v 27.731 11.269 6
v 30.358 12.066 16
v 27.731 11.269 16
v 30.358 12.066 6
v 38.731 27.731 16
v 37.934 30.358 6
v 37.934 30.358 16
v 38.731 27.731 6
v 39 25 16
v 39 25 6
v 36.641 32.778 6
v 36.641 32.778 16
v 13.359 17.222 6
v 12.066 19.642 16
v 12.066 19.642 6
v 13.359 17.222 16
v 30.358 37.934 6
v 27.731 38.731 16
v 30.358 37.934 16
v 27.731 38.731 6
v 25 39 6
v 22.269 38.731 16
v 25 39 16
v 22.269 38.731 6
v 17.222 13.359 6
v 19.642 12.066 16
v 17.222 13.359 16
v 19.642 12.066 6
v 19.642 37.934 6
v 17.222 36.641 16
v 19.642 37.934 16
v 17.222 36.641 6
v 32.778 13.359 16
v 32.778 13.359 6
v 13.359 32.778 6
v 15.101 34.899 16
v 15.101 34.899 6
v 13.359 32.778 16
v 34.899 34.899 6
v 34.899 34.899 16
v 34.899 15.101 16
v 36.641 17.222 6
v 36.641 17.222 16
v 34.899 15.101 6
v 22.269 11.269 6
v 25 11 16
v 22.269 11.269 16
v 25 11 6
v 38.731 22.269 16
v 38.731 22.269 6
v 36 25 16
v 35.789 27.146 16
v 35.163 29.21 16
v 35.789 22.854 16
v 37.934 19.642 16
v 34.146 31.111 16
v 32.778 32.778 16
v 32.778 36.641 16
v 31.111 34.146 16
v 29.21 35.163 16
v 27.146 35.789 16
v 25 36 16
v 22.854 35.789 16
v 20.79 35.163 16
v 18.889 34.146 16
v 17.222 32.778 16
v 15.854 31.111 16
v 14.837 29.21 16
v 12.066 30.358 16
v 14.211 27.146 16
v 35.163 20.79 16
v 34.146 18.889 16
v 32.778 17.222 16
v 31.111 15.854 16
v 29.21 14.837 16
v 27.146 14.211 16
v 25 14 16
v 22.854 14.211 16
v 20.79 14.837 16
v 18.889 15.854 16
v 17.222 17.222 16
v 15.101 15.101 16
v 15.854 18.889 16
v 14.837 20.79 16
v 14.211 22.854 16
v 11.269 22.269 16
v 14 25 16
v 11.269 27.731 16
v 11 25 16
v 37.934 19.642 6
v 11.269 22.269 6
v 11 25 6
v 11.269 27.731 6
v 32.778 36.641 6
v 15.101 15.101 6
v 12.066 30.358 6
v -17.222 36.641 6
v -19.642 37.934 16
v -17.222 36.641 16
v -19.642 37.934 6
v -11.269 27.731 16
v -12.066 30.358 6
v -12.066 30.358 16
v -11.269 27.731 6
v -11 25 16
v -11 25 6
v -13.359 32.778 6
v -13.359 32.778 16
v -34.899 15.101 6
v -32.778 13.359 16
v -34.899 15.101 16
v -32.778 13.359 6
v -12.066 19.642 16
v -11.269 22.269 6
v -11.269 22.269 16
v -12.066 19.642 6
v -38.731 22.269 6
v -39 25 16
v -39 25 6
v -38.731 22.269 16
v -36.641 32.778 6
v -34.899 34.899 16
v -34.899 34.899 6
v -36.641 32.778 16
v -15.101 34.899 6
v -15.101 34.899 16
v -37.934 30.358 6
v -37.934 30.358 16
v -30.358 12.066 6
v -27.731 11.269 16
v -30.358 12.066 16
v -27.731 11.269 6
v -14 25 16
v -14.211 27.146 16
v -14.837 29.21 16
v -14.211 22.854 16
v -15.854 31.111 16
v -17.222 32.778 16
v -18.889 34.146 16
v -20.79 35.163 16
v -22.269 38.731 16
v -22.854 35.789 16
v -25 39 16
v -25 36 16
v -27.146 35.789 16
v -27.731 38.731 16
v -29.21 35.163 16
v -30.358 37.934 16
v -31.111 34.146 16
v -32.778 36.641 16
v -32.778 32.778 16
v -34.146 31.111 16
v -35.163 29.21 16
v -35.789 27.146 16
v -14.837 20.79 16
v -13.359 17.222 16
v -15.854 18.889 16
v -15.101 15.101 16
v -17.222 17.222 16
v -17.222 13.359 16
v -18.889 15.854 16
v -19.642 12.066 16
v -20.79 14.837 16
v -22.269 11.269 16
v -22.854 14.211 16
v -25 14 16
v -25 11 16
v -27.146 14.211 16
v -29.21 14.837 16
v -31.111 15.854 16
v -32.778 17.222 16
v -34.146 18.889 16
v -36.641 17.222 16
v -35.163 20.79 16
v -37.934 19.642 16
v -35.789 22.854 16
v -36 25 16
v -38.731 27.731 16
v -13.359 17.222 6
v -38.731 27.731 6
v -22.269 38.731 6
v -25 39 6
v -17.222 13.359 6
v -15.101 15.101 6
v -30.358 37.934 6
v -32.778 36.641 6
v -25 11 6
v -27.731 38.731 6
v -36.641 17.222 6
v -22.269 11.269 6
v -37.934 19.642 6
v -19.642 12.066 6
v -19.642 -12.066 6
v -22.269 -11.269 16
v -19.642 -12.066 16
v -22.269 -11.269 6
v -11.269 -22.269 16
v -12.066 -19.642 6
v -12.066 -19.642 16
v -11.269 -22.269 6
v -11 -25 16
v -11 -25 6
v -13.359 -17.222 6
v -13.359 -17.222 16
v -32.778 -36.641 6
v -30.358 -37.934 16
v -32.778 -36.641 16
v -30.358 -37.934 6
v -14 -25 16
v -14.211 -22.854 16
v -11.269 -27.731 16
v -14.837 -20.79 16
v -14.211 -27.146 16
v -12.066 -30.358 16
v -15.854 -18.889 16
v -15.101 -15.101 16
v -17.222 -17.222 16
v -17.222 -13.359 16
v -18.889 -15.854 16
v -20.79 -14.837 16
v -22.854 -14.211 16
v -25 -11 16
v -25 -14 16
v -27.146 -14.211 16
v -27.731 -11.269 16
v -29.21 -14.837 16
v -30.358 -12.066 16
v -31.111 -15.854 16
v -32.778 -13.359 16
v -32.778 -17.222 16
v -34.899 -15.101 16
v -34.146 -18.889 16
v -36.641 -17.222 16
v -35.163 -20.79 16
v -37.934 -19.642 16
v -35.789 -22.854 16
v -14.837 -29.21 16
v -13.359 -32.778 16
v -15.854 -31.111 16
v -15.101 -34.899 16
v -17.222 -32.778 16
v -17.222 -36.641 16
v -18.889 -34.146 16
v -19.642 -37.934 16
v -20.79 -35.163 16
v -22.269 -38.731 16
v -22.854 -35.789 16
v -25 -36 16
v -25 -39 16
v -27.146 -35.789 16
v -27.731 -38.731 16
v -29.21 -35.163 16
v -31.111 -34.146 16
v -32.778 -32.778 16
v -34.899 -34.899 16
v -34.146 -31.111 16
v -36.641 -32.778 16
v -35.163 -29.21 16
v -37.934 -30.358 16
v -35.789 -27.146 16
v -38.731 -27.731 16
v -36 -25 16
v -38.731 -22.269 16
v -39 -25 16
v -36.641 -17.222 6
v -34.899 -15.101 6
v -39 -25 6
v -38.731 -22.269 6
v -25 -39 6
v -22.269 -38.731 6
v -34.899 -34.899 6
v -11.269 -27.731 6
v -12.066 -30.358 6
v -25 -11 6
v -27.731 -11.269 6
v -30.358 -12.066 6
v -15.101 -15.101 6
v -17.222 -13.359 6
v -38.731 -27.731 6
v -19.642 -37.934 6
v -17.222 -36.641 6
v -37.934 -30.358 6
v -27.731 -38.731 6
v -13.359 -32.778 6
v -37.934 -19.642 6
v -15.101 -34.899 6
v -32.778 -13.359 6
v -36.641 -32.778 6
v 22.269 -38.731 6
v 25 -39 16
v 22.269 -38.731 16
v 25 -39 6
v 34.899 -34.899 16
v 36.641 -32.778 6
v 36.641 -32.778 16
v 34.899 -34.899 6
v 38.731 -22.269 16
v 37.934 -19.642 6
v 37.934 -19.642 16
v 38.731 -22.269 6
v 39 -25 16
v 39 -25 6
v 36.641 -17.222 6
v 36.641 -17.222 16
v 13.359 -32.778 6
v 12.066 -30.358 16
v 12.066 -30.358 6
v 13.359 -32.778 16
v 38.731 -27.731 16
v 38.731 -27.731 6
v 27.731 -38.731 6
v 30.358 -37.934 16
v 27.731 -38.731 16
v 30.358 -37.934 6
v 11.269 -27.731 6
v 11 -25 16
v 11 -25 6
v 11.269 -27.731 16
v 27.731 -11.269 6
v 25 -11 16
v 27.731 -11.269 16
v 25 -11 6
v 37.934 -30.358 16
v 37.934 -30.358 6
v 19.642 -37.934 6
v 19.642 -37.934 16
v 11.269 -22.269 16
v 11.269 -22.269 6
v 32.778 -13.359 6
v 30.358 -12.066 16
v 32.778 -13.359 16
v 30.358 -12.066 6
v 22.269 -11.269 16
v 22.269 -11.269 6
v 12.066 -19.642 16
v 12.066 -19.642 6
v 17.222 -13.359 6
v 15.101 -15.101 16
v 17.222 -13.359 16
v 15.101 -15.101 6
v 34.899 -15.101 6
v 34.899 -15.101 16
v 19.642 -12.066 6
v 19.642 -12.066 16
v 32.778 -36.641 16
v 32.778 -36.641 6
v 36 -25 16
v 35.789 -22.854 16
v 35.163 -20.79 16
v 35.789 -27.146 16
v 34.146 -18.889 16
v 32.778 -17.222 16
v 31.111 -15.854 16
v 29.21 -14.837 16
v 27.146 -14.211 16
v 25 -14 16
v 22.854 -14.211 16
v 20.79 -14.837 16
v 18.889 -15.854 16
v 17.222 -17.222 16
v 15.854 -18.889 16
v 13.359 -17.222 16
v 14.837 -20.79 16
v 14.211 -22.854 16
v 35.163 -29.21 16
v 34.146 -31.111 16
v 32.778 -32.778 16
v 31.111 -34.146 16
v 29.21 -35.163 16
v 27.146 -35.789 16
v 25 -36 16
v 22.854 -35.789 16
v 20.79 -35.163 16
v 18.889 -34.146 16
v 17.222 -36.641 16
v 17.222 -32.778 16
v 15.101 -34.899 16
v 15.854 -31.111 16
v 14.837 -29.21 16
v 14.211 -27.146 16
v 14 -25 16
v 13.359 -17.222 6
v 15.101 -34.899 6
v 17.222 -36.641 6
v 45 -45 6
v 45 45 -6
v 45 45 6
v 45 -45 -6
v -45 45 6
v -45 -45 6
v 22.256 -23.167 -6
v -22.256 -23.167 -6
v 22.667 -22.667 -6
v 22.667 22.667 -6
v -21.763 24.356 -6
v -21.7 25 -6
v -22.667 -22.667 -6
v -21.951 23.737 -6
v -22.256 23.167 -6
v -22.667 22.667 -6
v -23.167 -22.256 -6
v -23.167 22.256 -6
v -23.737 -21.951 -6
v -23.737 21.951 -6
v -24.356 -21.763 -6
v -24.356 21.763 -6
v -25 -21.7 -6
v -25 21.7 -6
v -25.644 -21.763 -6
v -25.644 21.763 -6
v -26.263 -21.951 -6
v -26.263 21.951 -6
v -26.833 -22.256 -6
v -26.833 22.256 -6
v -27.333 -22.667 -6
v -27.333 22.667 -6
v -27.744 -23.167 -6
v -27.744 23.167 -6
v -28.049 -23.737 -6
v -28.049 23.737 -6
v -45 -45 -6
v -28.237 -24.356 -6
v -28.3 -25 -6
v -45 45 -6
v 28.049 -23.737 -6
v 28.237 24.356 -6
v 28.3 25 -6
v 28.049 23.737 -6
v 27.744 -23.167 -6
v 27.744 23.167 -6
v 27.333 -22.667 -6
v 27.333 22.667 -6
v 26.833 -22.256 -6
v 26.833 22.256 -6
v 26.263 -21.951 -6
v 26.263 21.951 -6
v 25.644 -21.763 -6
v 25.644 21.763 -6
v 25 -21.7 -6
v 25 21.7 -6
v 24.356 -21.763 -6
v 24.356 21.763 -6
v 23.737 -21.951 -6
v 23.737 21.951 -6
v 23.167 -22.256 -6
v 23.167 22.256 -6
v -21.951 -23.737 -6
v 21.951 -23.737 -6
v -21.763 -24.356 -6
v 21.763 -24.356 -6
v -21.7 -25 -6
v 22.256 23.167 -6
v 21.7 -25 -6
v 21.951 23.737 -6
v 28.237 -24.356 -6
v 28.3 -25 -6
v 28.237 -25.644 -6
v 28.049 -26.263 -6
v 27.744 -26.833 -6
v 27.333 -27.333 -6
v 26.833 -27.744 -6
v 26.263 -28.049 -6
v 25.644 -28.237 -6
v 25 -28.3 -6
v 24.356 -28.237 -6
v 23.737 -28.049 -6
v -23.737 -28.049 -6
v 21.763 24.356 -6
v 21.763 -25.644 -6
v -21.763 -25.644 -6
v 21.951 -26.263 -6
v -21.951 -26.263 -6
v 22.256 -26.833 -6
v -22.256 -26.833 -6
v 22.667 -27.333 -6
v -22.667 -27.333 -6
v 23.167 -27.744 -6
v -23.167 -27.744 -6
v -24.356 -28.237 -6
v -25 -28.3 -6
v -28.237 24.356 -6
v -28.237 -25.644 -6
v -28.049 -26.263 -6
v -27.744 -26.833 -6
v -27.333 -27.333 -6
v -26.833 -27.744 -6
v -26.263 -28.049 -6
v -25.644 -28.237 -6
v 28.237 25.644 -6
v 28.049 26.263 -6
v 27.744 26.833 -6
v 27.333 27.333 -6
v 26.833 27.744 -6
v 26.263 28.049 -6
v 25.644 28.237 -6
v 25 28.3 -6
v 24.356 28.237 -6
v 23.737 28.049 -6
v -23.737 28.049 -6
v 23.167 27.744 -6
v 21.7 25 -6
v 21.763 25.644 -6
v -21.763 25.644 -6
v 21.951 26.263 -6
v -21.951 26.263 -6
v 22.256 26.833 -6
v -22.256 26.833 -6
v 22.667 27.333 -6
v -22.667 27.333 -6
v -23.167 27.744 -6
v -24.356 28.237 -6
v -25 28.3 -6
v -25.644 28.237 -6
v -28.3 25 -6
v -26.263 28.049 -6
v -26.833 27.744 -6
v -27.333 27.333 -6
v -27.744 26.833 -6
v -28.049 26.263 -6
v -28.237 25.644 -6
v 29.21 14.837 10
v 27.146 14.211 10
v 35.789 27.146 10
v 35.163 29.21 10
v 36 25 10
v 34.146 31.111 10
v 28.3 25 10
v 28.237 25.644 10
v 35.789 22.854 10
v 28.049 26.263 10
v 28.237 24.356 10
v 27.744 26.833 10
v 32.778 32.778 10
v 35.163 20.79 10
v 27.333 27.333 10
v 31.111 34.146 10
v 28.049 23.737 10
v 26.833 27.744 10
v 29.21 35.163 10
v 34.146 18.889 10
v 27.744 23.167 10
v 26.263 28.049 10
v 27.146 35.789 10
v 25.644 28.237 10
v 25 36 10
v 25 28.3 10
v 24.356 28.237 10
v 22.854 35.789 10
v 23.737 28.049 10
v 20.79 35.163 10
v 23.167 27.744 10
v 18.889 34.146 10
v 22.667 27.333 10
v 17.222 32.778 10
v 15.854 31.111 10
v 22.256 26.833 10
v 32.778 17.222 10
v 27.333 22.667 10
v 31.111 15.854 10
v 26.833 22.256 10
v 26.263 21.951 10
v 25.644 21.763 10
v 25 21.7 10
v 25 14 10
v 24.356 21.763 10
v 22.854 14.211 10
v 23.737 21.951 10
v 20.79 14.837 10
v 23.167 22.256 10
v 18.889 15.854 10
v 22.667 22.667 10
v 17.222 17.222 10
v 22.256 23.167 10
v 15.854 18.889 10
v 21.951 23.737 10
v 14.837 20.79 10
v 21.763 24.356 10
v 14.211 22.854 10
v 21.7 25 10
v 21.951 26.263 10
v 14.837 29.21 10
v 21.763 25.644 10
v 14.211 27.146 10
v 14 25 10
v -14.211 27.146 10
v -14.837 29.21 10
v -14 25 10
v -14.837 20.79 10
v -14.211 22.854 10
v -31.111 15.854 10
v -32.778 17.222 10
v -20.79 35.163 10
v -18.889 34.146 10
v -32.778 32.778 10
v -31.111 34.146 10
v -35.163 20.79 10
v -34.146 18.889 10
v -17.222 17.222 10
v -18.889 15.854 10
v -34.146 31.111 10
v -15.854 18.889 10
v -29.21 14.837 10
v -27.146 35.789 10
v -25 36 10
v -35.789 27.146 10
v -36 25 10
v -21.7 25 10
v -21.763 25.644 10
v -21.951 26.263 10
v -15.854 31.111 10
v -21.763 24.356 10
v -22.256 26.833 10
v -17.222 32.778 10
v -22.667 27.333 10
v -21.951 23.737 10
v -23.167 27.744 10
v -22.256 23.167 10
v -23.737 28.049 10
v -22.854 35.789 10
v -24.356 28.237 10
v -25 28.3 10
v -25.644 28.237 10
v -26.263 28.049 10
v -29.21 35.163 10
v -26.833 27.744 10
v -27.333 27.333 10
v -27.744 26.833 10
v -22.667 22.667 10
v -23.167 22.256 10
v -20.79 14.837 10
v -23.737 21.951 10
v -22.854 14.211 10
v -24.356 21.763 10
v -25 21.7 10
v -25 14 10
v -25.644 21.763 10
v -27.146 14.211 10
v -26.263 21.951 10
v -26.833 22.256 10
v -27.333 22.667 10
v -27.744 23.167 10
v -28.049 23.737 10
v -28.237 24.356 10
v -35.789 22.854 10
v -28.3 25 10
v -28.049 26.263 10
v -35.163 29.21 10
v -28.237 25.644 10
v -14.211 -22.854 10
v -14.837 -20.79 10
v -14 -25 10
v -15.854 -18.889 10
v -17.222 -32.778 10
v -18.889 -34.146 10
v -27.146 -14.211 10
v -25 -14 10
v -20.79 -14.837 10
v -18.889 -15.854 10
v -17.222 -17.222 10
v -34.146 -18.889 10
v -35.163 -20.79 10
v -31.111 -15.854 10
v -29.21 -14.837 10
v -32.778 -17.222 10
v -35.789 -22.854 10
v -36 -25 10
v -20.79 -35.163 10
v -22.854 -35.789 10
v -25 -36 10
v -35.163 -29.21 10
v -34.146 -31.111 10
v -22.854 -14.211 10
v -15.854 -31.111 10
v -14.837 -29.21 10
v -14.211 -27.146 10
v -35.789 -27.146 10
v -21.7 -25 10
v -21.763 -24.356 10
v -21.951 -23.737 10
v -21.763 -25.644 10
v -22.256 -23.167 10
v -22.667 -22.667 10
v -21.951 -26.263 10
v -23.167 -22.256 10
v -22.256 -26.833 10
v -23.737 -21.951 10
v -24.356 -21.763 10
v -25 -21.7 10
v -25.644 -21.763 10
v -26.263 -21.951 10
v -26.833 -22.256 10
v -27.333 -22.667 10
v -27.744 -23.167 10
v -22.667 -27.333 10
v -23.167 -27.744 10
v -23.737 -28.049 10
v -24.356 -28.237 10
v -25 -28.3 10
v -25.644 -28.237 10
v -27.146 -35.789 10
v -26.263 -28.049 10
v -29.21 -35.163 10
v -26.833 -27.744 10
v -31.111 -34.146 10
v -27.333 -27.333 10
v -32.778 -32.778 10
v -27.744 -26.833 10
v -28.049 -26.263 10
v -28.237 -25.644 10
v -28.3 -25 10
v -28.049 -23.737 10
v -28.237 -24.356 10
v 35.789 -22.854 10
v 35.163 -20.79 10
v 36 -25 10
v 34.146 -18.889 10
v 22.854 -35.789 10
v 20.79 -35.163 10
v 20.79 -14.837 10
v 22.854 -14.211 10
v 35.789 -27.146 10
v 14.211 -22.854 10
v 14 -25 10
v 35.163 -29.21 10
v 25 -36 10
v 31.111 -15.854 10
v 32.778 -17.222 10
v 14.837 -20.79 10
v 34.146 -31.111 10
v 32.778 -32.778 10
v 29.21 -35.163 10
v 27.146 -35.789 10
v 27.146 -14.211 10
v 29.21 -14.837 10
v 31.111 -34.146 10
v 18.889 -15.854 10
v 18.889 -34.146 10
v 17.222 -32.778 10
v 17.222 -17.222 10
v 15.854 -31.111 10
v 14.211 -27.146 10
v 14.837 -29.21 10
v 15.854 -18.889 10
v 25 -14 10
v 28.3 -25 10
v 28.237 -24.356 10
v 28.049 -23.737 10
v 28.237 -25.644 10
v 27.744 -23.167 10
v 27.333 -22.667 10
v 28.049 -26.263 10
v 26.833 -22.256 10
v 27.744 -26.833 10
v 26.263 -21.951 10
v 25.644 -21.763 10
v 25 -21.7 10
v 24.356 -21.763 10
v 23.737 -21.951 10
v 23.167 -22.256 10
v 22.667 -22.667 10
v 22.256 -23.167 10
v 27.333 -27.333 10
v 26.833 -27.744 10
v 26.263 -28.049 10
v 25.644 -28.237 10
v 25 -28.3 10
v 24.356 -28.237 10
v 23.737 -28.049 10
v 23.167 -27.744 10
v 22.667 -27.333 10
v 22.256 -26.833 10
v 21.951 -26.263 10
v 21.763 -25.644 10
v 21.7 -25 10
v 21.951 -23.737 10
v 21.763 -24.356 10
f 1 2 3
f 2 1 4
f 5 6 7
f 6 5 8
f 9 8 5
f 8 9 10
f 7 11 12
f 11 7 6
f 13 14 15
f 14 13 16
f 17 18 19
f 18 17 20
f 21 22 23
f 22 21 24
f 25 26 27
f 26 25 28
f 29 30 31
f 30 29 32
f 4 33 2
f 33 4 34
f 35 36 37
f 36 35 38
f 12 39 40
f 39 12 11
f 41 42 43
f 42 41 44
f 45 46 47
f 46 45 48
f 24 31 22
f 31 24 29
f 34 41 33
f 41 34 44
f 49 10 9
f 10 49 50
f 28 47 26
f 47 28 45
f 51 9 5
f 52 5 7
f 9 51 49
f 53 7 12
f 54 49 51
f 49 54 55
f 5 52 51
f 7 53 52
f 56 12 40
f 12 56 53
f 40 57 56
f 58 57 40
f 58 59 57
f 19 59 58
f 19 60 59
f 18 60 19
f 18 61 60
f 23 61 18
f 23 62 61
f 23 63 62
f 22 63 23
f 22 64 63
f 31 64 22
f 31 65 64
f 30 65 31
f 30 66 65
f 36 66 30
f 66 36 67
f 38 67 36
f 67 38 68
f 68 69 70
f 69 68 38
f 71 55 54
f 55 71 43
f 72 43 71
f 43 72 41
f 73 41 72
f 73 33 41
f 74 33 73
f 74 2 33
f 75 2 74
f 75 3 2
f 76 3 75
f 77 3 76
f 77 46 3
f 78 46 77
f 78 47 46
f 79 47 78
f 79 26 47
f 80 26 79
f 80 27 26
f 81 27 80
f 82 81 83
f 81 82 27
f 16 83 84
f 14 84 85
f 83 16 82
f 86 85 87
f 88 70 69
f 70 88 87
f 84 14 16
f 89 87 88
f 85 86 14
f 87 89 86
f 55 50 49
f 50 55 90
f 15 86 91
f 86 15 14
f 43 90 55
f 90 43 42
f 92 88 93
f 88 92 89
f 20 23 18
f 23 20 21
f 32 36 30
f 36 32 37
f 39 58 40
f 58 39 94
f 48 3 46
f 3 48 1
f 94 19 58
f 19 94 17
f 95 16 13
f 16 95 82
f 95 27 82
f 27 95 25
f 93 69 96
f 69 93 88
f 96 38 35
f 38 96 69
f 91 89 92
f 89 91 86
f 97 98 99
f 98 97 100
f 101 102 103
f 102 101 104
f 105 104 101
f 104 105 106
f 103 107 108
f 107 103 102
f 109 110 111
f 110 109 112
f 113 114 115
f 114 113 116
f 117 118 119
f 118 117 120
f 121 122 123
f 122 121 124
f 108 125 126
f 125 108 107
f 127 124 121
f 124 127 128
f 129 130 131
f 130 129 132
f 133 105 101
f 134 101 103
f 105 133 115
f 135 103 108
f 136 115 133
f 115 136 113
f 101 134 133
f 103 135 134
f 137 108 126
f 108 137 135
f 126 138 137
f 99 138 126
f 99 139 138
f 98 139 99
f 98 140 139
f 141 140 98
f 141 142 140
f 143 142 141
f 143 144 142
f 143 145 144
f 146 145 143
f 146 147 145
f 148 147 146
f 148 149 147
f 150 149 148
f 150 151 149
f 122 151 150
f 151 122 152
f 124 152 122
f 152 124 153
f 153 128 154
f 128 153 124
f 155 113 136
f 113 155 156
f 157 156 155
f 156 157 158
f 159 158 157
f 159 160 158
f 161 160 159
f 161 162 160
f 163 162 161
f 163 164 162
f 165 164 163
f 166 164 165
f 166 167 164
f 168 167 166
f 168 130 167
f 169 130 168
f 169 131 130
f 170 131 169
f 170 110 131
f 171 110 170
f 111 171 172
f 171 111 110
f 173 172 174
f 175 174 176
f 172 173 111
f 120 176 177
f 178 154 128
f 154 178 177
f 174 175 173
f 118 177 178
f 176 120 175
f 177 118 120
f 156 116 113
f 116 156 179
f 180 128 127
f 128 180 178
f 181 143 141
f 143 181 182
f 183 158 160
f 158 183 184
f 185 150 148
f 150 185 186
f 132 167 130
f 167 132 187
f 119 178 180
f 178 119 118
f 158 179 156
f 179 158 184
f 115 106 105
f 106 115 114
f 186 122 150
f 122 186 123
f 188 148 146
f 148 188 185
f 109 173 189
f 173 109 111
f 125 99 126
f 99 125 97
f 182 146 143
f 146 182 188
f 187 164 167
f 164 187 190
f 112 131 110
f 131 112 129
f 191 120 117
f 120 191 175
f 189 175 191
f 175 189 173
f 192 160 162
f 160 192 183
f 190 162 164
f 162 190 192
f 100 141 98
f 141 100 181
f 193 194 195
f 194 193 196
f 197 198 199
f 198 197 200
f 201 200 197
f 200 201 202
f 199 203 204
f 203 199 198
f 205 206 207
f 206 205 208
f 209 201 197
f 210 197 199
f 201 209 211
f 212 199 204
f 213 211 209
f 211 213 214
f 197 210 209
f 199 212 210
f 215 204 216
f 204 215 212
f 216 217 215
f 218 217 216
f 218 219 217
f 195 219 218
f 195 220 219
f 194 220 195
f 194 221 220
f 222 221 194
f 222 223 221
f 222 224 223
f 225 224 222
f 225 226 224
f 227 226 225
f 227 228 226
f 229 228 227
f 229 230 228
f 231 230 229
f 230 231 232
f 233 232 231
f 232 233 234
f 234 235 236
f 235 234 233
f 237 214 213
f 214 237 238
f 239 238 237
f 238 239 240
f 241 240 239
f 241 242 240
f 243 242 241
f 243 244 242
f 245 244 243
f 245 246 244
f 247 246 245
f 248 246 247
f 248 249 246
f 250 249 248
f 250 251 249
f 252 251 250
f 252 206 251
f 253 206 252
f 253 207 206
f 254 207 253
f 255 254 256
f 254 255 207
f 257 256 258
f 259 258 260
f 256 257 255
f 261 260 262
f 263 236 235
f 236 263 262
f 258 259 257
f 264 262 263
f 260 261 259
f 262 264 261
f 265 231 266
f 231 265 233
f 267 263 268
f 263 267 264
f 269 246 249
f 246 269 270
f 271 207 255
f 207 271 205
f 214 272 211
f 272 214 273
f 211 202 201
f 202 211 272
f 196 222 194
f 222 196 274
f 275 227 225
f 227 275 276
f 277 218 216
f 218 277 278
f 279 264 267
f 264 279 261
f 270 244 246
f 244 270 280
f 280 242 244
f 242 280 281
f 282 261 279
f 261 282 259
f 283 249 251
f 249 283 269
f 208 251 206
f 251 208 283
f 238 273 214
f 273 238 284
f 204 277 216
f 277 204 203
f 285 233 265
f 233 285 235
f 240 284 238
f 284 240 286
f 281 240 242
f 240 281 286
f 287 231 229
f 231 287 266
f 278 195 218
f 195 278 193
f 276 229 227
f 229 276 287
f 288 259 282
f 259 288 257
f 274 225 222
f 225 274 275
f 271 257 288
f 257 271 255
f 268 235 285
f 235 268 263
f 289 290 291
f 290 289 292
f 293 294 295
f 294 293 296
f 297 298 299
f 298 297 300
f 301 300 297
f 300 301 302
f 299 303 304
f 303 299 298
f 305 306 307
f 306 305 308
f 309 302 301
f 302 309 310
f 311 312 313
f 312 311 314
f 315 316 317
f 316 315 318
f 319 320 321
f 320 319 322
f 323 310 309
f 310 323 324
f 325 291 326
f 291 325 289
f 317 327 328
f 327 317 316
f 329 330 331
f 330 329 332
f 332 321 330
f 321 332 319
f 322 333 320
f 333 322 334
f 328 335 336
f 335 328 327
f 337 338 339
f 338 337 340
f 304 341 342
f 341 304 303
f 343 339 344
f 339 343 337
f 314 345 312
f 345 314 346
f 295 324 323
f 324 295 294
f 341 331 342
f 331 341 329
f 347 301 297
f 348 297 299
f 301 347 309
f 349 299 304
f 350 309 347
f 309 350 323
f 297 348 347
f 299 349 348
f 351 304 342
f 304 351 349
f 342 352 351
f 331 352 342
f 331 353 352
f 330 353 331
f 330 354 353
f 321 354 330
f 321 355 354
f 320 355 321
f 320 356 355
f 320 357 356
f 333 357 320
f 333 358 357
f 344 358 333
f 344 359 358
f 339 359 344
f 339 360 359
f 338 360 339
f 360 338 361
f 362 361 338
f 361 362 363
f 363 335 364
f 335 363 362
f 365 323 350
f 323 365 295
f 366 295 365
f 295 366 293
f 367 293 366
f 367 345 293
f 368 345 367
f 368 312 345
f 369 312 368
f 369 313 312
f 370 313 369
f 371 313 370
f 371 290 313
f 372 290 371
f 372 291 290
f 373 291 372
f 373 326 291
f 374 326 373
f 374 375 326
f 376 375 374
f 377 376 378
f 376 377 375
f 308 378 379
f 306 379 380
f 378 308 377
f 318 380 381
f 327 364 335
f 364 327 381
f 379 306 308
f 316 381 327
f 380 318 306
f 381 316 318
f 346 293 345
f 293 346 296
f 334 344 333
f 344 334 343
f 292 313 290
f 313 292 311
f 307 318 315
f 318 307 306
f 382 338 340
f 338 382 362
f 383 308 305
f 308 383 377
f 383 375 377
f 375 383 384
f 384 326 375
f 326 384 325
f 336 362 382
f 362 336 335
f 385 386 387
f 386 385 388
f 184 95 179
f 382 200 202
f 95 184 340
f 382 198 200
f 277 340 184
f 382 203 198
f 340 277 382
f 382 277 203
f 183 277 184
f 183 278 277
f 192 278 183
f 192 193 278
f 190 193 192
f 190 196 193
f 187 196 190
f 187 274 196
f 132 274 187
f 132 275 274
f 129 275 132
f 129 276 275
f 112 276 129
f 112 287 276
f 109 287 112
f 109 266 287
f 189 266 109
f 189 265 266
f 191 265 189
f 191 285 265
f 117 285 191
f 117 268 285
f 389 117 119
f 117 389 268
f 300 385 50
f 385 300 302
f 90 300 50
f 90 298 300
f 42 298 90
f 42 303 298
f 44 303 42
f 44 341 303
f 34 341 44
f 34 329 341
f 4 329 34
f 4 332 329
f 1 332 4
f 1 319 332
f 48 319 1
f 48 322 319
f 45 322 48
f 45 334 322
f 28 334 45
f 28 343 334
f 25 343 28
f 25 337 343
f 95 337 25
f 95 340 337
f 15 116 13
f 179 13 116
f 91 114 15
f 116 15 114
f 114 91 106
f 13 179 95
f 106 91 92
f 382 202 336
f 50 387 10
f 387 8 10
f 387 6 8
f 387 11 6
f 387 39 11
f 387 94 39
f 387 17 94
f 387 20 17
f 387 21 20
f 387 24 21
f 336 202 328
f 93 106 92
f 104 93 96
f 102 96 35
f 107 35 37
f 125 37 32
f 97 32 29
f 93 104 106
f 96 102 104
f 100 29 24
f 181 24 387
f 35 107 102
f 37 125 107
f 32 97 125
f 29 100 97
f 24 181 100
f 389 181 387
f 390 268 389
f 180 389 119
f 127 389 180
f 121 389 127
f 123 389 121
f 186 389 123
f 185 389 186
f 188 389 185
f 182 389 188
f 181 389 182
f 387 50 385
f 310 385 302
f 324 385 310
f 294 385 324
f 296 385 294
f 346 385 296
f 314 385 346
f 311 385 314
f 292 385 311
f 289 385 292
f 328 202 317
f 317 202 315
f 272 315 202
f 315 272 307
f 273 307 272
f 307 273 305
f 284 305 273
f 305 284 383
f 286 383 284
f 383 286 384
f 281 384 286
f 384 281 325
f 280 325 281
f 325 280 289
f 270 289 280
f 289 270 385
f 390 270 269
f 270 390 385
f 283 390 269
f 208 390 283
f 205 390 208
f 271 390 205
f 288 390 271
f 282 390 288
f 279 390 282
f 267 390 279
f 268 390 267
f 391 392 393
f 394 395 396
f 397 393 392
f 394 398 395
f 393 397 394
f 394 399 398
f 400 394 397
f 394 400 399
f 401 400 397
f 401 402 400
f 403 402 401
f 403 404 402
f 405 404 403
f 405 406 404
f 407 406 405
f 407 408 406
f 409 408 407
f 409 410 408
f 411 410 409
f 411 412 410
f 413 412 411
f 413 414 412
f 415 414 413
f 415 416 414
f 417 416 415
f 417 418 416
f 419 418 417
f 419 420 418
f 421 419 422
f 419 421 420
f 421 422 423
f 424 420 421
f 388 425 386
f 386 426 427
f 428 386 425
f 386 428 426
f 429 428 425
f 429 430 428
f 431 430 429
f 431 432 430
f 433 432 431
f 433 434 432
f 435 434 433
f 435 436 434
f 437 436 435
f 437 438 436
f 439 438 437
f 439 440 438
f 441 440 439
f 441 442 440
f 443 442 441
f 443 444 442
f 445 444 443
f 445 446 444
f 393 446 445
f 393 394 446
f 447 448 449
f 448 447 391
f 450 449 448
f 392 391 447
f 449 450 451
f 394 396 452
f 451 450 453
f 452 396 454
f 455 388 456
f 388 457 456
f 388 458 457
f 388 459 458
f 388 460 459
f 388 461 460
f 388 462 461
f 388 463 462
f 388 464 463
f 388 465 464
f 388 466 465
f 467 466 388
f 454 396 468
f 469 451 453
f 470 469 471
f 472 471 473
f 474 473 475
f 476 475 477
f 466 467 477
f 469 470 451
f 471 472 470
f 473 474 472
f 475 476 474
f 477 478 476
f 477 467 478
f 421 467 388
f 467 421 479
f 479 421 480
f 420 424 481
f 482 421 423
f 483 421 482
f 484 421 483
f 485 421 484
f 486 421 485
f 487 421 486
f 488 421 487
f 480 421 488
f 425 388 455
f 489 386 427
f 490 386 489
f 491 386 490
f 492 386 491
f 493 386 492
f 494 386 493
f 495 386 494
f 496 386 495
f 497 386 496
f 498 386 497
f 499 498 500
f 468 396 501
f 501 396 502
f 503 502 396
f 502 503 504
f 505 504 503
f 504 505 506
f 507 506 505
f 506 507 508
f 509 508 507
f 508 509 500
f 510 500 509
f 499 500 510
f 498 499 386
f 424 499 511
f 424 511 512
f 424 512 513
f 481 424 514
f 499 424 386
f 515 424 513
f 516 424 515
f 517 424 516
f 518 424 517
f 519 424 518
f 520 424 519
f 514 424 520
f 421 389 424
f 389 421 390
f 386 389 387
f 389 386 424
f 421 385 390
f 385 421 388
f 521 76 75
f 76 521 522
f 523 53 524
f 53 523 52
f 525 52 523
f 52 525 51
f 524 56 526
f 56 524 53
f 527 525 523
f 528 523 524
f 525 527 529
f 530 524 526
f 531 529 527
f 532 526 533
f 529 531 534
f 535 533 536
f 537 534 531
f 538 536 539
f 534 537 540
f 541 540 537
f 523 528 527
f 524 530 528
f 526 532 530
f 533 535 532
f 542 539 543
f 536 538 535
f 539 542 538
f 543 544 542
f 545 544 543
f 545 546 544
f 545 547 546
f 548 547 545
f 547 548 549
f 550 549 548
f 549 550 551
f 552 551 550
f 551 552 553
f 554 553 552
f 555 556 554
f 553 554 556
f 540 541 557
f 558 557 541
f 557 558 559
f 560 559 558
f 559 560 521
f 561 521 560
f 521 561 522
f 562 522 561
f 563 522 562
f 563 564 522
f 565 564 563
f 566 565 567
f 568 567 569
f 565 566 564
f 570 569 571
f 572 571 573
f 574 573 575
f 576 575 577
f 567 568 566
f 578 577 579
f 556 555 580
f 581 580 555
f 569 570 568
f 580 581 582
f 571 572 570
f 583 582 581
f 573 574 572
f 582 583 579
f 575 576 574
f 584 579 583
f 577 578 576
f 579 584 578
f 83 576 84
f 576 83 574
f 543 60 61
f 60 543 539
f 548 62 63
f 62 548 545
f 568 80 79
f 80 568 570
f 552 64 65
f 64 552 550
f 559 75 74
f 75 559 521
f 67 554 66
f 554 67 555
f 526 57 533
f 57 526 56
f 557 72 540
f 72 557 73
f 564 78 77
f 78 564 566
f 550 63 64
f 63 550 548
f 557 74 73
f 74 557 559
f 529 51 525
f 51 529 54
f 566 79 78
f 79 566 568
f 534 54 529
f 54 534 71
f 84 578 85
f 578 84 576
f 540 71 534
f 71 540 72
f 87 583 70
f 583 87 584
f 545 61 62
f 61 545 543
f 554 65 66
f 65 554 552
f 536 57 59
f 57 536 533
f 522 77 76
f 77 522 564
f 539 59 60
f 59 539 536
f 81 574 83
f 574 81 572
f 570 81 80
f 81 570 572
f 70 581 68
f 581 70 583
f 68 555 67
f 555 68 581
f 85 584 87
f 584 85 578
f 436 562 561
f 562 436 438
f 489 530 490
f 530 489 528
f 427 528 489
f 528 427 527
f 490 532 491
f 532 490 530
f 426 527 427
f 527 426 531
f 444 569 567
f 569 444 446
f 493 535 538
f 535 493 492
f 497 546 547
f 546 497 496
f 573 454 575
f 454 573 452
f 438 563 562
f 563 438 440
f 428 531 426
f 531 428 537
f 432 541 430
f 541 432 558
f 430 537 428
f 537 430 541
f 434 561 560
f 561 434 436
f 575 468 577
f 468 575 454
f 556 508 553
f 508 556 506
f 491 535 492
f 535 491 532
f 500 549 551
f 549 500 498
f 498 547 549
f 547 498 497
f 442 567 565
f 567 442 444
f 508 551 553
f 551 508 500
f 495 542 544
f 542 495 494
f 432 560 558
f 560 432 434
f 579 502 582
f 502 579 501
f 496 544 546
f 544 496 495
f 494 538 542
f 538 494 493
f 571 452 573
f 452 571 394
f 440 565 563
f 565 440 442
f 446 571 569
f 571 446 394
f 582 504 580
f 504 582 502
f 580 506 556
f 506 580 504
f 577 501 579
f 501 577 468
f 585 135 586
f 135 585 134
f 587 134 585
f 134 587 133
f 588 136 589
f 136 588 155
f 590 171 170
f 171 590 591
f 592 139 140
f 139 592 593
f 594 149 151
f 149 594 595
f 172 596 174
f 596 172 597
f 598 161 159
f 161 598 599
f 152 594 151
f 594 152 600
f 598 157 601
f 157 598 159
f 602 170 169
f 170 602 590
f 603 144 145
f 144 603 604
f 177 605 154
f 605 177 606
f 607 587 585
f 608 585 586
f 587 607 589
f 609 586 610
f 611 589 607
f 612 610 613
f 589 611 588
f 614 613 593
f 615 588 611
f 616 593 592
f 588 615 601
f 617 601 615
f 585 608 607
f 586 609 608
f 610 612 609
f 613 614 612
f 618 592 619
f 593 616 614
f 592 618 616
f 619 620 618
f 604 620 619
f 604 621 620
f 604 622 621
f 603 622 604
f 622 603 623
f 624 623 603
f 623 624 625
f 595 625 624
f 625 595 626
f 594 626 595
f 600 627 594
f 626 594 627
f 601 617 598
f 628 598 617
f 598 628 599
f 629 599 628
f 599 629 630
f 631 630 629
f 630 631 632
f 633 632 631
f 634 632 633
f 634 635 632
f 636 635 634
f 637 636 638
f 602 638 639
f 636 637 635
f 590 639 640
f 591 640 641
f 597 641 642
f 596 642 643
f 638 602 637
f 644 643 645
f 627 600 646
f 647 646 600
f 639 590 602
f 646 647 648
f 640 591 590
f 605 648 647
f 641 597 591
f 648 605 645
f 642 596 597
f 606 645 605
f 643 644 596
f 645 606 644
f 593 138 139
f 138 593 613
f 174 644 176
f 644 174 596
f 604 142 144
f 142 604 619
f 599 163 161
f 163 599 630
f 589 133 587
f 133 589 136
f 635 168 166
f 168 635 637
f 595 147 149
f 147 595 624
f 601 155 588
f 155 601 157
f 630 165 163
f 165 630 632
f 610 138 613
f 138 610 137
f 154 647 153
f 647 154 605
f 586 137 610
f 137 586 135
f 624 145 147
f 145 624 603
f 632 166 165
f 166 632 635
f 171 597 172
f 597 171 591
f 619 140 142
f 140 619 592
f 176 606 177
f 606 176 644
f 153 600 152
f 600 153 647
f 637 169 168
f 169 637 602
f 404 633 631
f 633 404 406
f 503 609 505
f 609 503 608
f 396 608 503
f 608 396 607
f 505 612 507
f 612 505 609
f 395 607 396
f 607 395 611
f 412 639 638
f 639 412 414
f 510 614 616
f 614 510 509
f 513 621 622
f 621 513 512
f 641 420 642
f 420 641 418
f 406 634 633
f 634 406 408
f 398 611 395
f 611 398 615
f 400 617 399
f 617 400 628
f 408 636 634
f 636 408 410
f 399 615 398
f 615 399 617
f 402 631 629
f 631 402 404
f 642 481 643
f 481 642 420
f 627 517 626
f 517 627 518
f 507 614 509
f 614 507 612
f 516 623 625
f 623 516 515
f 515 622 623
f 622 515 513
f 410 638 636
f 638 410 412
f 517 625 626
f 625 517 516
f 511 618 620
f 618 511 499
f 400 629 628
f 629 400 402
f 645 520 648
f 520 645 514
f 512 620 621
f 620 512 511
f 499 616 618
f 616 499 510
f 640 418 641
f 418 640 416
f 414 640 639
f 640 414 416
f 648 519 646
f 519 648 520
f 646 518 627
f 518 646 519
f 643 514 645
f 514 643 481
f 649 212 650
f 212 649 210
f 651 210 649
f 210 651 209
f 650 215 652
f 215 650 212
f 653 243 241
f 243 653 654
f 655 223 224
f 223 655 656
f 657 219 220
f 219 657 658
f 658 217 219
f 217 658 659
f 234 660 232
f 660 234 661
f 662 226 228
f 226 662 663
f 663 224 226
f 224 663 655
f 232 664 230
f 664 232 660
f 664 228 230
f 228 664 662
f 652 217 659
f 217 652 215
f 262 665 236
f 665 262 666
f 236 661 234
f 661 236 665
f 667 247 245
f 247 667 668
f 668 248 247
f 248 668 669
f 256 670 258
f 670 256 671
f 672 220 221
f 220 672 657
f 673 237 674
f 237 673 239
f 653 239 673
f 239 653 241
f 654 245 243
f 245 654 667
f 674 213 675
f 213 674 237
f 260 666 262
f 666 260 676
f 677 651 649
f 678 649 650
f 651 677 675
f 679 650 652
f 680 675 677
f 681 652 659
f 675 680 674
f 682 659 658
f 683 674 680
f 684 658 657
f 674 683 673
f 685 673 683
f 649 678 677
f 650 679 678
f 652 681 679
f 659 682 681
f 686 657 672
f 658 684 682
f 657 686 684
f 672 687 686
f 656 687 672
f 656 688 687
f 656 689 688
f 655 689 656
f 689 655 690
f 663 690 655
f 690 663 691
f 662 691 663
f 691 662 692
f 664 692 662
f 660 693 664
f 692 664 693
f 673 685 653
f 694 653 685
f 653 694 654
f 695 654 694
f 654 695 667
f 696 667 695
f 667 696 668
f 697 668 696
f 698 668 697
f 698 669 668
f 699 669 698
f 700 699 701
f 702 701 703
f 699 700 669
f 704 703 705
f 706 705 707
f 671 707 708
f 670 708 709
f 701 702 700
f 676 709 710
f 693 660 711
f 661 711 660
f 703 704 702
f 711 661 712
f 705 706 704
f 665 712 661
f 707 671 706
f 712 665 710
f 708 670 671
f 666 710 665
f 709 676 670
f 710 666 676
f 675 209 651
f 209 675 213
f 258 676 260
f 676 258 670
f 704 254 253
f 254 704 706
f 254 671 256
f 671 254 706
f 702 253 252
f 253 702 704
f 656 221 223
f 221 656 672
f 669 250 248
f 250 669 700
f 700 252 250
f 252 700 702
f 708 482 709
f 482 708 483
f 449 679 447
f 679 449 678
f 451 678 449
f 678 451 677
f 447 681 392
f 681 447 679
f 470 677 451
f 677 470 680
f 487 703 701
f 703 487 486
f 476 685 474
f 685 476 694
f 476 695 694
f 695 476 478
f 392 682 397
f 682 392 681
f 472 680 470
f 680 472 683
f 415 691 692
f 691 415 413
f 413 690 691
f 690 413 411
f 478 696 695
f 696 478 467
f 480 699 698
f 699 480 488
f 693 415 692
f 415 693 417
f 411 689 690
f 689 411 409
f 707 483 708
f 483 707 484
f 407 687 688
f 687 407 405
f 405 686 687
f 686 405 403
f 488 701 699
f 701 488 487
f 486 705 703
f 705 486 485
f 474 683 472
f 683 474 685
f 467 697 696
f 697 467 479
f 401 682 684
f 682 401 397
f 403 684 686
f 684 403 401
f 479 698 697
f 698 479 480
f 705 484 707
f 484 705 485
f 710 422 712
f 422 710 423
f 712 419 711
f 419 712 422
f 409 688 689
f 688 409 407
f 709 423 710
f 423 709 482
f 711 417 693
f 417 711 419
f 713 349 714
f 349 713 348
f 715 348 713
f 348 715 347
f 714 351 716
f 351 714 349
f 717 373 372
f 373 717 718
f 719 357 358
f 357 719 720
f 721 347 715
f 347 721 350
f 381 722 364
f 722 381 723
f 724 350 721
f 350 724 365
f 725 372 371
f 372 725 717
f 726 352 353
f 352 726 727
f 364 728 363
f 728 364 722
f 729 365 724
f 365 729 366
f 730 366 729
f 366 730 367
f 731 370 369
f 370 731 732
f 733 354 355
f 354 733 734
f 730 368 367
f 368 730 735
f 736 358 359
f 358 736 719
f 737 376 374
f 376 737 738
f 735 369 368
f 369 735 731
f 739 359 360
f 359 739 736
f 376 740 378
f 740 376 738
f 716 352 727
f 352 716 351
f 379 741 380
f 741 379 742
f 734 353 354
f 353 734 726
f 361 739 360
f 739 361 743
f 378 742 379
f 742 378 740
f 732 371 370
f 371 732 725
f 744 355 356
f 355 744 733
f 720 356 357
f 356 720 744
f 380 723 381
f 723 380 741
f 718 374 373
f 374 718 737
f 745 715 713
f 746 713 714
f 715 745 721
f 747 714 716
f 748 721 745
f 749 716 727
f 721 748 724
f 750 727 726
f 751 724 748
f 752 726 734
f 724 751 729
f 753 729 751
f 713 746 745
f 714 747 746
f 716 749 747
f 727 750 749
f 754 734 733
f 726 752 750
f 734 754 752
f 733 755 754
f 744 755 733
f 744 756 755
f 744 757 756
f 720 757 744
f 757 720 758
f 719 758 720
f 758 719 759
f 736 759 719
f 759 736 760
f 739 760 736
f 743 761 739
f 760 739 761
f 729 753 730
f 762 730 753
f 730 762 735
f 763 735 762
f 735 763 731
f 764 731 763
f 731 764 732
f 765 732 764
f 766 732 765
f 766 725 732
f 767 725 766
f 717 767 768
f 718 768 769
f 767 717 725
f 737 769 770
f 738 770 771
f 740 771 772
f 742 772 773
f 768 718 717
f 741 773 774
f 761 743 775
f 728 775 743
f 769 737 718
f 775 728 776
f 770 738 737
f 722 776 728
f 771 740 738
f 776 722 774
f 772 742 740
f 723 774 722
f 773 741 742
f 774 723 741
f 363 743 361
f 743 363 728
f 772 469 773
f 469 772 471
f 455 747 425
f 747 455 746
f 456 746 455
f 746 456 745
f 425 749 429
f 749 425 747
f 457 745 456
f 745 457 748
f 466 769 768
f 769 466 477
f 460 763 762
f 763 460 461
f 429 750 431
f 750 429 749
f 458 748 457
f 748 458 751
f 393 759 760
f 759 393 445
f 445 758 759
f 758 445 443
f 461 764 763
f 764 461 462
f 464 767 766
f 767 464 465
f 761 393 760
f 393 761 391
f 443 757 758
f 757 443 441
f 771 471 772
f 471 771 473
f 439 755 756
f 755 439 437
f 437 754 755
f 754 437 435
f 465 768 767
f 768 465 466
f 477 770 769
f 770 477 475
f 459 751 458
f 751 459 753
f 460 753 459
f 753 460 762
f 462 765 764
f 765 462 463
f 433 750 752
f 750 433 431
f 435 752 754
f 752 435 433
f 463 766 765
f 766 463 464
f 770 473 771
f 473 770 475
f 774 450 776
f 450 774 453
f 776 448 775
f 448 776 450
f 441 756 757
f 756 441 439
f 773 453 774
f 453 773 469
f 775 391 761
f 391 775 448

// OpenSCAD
$fn = 32;

// ----------------------------------------------------------------------
// Socket pad plate
// bosses with counterbored sockets for the screws
// ----------------------------------------------------------------------

// --- parameters (mm) ---
base_t = 12;           // base plate thickness
boss_h = 10;           // boss height above the base plate
boss_d = 28;           // boss diameter
socket_d = 22;         // socket diameter
socket_depth = 6;      // socket depth from the boss face
bolt_d = 6.6;          // screw clearance hole through the socket floor
plate = [90, 90, 12];  // overall size (x, y, z)
edge = 20;             // boss centre offset from the plate edge
pads = 4;              // boss count, one per corner

// --- derived feature positions (mm) ---
height = base_t + boss_h;        // = 22   overall height of the part
corner_x = plate[0] / 2 - edge;  // = 25   boss centre X
corner_y = plate[1] / 2 - edge;  // = 25   boss centre Y
feature_centers = [
  [corner_x, corner_y],
  [-corner_x, corner_y],
  [-corner_x, -corner_y],
  [corner_x, -corner_y]
];   // boss centres: sockets, holes and the pads themselves are placed from here

// base plate, bosses on feature_centers, socket + through hole in each
difference() {
  union() {
    cube(plate, center = true);
    for (centre = feature_centers)
      translate([centre[0], centre[1], plate[2] / 2 - 1])
        cylinder(d = boss_d, h = boss_h + 1);
  }
  for (centre = feature_centers) {
    translate([centre[0], centre[1], plate[2] / 2 + boss_h - socket_depth])
      cylinder(d = socket_d, h = socket_depth + 1);
    translate([centre[0], centre[1], -height])
      cylinder(d = bolt_d, h = 2 * height + 2);  // through the socket floor
  }
}
